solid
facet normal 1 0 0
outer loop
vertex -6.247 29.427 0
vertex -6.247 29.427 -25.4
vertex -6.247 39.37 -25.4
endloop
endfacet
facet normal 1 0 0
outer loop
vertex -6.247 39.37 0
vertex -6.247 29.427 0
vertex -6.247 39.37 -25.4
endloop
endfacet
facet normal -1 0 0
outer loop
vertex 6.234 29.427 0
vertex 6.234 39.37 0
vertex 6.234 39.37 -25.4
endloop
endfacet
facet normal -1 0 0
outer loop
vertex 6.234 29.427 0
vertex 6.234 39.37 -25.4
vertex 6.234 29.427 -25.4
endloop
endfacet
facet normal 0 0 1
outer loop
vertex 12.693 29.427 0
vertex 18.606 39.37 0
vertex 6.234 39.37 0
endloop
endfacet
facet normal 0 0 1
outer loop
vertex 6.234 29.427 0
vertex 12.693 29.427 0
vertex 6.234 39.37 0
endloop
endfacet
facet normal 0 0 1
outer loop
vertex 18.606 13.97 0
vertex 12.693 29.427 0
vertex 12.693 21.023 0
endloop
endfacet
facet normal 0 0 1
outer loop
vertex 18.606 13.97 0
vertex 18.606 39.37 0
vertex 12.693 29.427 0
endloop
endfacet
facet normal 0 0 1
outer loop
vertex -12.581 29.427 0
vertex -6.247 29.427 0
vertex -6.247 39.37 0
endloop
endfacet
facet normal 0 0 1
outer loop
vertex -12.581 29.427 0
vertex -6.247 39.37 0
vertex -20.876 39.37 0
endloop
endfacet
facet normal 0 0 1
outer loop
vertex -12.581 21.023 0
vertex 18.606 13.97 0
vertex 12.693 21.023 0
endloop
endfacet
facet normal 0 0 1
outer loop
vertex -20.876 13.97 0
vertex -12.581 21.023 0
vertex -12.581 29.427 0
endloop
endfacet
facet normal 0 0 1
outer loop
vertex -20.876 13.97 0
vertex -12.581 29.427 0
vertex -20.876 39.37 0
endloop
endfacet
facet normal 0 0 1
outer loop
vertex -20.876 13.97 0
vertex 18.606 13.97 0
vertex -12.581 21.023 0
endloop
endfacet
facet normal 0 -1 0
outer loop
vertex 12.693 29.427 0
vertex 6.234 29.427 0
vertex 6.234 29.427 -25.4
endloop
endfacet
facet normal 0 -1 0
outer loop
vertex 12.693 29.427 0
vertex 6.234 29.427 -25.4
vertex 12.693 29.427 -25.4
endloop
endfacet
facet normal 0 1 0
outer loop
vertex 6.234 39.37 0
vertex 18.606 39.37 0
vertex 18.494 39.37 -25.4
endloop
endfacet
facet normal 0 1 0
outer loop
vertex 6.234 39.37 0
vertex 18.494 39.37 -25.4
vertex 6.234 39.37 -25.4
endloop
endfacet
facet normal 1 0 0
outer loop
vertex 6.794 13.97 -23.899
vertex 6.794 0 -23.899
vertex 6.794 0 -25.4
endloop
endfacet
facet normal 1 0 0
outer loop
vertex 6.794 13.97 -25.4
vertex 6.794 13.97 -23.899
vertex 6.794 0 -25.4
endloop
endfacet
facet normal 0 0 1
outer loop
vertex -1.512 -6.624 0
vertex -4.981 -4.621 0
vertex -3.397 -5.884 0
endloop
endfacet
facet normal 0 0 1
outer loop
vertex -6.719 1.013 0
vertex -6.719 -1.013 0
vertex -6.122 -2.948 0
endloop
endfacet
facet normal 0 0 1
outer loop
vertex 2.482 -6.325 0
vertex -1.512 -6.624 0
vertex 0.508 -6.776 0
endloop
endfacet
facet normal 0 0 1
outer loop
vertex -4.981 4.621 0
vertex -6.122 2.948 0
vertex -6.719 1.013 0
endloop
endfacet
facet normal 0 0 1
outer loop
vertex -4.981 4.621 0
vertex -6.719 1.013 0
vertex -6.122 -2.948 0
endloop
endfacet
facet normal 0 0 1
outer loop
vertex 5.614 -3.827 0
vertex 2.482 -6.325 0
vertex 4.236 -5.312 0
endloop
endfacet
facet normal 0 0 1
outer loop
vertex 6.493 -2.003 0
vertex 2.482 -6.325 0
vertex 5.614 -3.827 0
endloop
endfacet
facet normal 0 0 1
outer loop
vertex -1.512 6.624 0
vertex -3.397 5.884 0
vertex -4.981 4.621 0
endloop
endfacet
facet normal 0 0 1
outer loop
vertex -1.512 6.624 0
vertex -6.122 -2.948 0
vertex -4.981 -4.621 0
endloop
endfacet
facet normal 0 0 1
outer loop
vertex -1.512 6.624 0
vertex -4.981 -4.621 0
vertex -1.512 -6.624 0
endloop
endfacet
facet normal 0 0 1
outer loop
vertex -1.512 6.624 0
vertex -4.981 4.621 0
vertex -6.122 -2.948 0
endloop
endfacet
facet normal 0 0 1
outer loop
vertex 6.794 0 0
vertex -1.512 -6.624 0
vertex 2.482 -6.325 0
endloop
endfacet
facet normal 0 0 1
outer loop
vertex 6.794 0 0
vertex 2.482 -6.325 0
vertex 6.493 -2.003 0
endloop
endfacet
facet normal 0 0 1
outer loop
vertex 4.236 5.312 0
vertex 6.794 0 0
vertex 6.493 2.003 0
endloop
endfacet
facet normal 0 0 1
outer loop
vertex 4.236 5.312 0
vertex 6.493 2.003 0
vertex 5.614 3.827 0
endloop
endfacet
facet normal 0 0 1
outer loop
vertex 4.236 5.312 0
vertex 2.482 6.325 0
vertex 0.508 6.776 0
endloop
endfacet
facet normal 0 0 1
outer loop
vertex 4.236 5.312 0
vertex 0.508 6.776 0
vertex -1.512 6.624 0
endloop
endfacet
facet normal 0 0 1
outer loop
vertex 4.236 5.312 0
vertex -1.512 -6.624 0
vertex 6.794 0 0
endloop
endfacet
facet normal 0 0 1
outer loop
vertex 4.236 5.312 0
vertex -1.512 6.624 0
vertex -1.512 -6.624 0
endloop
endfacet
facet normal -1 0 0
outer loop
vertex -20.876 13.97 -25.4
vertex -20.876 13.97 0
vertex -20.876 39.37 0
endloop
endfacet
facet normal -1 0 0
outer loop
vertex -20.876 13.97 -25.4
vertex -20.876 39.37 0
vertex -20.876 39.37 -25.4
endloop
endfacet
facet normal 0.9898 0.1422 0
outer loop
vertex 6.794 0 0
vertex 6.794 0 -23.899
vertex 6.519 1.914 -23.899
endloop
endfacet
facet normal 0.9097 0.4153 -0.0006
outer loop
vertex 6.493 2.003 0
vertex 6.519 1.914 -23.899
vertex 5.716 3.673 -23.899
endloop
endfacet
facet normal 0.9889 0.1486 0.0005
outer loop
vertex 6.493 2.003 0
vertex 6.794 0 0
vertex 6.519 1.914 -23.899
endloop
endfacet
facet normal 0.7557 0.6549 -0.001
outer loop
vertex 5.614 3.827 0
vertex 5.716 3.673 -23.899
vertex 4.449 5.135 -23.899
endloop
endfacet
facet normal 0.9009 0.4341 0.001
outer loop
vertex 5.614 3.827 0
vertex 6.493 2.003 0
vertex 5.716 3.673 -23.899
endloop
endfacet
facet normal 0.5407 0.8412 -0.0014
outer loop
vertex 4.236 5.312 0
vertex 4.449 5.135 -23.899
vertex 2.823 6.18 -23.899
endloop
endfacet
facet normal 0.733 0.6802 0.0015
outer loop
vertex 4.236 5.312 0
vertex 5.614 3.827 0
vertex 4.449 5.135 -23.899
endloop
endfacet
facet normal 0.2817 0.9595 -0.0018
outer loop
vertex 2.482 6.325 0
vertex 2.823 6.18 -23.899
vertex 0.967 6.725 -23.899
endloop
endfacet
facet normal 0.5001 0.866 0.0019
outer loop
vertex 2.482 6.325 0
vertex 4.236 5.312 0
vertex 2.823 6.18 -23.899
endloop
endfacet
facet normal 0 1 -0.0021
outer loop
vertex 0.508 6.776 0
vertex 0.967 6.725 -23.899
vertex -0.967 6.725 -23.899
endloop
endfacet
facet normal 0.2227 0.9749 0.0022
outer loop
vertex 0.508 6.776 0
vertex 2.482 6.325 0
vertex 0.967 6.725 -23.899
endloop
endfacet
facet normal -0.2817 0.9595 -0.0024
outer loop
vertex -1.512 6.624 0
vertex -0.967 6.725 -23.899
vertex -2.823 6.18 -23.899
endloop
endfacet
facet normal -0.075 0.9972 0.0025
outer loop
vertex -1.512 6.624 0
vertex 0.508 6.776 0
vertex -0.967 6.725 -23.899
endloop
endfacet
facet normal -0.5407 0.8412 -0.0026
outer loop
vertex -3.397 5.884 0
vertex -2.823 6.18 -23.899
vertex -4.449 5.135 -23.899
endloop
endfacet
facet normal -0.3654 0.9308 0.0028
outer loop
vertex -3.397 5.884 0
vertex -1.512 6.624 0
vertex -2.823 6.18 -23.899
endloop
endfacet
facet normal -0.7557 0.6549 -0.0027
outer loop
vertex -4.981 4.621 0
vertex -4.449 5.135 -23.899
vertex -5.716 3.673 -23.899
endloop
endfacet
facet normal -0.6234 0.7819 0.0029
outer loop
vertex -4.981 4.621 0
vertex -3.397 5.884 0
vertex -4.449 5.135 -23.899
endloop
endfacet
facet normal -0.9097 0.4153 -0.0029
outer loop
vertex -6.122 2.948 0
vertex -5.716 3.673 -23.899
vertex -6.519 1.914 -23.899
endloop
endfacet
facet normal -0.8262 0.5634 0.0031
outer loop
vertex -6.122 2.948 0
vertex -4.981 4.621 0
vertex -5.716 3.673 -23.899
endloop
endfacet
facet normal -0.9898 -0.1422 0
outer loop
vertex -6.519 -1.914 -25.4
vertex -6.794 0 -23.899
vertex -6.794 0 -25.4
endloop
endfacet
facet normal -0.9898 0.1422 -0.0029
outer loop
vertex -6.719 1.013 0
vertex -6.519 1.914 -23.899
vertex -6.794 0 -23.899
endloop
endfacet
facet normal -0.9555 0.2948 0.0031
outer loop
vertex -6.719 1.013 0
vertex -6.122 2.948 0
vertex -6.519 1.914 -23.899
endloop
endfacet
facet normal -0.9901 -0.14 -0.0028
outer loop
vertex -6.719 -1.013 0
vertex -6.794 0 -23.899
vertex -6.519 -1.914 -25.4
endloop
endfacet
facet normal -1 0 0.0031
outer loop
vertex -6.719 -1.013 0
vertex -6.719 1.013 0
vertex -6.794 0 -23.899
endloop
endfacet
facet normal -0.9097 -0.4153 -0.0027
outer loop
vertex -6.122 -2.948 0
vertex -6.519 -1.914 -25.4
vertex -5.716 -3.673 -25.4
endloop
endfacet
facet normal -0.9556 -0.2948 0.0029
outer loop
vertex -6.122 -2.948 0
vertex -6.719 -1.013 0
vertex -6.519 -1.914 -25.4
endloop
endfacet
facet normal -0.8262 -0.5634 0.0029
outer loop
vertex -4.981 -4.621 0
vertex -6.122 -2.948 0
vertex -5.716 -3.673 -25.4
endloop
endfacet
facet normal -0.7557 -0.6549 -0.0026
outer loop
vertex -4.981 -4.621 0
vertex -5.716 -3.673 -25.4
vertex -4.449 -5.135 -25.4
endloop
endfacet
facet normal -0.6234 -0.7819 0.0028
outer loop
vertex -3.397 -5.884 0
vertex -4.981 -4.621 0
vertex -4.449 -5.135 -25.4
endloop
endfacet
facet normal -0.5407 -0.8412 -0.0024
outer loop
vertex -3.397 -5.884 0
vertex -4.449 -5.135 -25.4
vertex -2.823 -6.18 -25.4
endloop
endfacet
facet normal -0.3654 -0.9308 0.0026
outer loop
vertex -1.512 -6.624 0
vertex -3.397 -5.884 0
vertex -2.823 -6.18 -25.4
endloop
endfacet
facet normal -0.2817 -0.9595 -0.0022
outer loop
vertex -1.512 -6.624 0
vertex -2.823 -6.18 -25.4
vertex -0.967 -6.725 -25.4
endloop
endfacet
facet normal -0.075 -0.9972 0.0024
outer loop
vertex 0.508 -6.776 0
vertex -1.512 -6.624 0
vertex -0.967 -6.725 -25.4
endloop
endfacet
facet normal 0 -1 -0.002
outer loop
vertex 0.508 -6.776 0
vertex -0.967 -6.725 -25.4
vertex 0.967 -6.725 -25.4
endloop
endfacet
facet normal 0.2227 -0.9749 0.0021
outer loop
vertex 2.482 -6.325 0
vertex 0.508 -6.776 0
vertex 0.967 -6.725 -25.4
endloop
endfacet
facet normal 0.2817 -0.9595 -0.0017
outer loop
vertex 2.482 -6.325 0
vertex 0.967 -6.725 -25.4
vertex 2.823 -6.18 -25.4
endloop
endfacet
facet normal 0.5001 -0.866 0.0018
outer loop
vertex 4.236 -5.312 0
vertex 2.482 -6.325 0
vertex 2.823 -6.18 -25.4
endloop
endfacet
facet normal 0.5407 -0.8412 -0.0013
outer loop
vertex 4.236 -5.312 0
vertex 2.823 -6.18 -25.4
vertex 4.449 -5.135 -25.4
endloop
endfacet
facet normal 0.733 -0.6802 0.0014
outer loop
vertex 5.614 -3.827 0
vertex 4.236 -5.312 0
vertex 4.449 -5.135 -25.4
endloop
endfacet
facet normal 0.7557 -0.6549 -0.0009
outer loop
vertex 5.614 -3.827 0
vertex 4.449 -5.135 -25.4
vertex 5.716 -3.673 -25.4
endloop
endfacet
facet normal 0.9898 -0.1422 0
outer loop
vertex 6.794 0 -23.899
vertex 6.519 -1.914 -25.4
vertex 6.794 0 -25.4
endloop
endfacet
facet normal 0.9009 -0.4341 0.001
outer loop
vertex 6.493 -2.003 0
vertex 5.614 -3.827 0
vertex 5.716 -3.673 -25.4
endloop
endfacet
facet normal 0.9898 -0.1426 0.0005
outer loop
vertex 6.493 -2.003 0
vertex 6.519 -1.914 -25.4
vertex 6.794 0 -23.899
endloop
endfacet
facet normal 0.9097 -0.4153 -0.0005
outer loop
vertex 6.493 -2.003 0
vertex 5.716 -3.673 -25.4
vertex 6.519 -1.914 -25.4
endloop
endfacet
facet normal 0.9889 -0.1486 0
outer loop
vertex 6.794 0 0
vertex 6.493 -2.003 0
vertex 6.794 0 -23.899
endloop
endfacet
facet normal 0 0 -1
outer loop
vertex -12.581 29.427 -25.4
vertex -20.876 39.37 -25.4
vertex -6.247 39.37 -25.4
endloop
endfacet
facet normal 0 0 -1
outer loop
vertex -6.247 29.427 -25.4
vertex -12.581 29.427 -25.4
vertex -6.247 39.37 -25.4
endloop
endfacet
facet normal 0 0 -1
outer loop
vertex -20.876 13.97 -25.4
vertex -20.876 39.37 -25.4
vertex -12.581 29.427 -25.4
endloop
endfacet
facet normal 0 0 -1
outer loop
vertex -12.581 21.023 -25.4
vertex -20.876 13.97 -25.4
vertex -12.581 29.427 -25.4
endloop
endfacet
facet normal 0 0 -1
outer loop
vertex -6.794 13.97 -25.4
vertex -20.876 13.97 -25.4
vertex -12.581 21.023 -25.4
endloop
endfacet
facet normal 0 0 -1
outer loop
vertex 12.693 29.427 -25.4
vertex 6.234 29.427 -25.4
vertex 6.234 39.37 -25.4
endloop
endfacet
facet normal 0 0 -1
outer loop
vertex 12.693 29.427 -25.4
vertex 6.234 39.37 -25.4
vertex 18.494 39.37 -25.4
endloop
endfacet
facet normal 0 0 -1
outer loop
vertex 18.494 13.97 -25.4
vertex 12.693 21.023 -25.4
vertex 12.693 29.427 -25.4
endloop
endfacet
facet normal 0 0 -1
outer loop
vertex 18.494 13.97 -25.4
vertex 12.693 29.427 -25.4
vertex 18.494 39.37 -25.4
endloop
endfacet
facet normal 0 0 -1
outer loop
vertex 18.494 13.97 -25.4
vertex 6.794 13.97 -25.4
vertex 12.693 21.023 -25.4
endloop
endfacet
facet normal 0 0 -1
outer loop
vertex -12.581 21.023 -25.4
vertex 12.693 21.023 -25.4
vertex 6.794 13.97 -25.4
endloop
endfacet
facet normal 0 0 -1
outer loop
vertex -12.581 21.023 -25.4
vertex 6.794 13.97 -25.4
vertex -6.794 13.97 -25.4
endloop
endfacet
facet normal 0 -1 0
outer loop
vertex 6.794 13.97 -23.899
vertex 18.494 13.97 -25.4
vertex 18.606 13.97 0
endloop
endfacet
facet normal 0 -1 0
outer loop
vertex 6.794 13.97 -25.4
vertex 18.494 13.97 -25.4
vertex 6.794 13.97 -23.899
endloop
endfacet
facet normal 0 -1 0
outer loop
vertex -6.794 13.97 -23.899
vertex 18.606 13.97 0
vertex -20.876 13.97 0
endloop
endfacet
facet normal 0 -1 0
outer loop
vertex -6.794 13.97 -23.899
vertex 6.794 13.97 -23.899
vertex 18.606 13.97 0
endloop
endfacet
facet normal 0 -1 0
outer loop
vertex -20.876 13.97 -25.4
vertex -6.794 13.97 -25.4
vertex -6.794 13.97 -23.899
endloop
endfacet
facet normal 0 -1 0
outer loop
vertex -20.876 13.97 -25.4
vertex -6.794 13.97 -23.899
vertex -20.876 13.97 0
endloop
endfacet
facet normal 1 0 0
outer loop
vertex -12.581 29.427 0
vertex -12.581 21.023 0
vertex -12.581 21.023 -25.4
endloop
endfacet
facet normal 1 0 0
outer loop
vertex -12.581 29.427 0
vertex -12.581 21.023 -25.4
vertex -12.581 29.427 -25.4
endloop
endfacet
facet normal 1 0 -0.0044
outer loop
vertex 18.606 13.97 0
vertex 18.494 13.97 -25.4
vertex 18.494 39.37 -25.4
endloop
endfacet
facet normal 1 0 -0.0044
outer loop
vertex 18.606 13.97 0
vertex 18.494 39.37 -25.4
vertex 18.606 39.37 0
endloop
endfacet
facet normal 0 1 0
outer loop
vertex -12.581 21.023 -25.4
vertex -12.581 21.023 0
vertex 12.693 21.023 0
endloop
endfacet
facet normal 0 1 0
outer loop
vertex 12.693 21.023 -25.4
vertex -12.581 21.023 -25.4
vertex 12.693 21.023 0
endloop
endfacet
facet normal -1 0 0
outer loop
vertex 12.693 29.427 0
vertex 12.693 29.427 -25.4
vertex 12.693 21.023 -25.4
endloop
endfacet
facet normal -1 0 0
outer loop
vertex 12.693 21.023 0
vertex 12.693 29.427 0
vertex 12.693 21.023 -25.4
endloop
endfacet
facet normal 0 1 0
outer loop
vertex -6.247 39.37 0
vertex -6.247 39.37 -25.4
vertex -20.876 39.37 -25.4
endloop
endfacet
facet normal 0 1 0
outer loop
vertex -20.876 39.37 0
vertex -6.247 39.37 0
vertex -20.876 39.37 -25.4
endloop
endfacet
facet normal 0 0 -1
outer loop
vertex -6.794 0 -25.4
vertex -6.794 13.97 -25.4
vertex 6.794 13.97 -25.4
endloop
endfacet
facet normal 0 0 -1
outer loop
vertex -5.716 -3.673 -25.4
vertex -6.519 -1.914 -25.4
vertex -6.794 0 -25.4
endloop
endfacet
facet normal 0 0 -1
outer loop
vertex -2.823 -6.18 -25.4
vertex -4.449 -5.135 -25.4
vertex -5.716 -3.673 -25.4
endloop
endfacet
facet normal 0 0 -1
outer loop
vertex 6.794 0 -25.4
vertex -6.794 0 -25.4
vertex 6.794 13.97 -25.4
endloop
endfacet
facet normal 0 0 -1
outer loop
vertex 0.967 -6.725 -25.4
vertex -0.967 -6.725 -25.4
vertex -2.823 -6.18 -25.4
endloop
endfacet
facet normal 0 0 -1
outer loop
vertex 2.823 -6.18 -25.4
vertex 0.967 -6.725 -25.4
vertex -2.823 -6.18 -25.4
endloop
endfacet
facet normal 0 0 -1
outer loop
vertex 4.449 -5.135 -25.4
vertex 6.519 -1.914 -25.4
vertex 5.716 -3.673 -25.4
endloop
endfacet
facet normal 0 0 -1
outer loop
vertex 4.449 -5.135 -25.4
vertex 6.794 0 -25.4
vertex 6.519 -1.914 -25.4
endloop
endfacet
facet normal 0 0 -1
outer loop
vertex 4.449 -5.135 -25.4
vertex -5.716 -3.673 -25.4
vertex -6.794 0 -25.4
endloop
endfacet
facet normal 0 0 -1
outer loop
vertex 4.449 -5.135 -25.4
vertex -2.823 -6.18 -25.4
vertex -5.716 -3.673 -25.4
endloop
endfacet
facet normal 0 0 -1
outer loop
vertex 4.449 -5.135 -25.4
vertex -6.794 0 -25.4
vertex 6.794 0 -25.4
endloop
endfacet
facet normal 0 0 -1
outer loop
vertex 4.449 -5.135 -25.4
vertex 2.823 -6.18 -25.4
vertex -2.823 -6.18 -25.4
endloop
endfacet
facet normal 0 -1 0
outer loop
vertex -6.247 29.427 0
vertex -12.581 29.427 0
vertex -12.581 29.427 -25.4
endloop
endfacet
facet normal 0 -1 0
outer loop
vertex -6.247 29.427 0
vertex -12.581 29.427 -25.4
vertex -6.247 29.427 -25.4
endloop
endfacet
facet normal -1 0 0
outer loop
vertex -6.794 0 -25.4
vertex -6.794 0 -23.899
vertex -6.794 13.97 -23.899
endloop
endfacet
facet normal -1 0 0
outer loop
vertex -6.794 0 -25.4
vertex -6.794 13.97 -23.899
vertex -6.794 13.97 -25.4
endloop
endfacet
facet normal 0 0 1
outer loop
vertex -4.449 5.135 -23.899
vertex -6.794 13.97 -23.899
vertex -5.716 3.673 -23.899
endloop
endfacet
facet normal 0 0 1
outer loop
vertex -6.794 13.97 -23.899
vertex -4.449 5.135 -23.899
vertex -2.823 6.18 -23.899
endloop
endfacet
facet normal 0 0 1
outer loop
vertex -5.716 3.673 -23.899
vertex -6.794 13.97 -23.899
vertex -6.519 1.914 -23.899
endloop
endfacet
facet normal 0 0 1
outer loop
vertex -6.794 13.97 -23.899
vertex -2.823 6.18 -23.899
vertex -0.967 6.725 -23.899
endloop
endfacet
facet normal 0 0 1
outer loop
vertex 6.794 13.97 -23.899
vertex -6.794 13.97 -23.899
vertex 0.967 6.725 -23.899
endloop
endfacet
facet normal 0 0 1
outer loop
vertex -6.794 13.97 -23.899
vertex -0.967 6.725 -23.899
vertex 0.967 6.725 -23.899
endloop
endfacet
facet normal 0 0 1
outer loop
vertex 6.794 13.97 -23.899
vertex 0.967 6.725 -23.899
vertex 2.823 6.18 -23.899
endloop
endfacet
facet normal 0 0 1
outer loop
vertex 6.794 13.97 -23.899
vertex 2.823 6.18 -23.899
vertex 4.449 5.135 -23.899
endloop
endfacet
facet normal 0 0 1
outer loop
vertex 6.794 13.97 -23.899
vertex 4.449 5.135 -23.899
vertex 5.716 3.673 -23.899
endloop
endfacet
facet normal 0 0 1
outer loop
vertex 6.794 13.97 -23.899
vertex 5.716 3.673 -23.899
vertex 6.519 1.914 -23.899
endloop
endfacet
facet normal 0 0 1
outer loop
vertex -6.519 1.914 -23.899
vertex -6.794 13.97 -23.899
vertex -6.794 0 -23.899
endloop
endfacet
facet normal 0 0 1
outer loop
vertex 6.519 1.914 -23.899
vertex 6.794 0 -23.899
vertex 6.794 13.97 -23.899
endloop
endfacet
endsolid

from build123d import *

# Parameters (mm, degrees)
SKETCH1_R           = 6.7945
BOSS_EXTRUDE1_DEPTH = 25.4
SKETCH2_W           = 13.589
SKETCH2_H           = 1.500538131
BOSS_EXTRUDE2_DEPTH = 13.97
BOSS_EXTRUDE3_DEPTH = 25.4
CUT_EXTRUDE1_DEPTH  = 27.94


with BuildPart() as part:
    # Sketch1 → Boss-Extrude1 (new body)
    with BuildSketch(Plane.XY):
        Circle(SKETCH1_R)
    extrude(amount=-BOSS_EXTRUDE1_DEPTH)

    # Sketch2 → Boss-Extrude2 (add)
    with BuildSketch(Plane(origin=(0, 0, 0), x_dir=(1, 0, 0), z_dir=(0, 1, 0))):
        with Locations((0, 24.649730935)):
            Rectangle(SKETCH2_W, SKETCH2_H)
    extrude(amount=BOSS_EXTRUDE2_DEPTH)

    # Sketch6 → Boss-Extrude3 (add)
    with BuildSketch(Plane(origin=(0, 13.97, 0), x_dir=(1, 0, 0), z_dir=(0, 1, 0))):
        Polygon((-20.876229987, 25.399999851), (18.493770013, 25.40000027), (18.6055, 0), (-20.876229987, 0), align=None)
    extrude(amount=BOSS_EXTRUDE3_DEPTH)

    # Sketch11 → Cut-Extrude1 (cut)
    with BuildSketch(Plane.XY):
        Polygon((0, 21.022742384), (-12.580876385, 21.022742384), (-12.580876385, 29.426569926), (-6.246648163, 29.426569926), (-6.246648163, 39.37), (0, 39.37), (6.233662889, 39.37), (6.233662889, 29.426569926), (12.693321373, 29.426569926), (12.693321373, 21.022742384), align=None)
    extrude(amount=-CUT_EXTRUDE1_DEPTH, mode=Mode.SUBTRACT)


solid = part.part
